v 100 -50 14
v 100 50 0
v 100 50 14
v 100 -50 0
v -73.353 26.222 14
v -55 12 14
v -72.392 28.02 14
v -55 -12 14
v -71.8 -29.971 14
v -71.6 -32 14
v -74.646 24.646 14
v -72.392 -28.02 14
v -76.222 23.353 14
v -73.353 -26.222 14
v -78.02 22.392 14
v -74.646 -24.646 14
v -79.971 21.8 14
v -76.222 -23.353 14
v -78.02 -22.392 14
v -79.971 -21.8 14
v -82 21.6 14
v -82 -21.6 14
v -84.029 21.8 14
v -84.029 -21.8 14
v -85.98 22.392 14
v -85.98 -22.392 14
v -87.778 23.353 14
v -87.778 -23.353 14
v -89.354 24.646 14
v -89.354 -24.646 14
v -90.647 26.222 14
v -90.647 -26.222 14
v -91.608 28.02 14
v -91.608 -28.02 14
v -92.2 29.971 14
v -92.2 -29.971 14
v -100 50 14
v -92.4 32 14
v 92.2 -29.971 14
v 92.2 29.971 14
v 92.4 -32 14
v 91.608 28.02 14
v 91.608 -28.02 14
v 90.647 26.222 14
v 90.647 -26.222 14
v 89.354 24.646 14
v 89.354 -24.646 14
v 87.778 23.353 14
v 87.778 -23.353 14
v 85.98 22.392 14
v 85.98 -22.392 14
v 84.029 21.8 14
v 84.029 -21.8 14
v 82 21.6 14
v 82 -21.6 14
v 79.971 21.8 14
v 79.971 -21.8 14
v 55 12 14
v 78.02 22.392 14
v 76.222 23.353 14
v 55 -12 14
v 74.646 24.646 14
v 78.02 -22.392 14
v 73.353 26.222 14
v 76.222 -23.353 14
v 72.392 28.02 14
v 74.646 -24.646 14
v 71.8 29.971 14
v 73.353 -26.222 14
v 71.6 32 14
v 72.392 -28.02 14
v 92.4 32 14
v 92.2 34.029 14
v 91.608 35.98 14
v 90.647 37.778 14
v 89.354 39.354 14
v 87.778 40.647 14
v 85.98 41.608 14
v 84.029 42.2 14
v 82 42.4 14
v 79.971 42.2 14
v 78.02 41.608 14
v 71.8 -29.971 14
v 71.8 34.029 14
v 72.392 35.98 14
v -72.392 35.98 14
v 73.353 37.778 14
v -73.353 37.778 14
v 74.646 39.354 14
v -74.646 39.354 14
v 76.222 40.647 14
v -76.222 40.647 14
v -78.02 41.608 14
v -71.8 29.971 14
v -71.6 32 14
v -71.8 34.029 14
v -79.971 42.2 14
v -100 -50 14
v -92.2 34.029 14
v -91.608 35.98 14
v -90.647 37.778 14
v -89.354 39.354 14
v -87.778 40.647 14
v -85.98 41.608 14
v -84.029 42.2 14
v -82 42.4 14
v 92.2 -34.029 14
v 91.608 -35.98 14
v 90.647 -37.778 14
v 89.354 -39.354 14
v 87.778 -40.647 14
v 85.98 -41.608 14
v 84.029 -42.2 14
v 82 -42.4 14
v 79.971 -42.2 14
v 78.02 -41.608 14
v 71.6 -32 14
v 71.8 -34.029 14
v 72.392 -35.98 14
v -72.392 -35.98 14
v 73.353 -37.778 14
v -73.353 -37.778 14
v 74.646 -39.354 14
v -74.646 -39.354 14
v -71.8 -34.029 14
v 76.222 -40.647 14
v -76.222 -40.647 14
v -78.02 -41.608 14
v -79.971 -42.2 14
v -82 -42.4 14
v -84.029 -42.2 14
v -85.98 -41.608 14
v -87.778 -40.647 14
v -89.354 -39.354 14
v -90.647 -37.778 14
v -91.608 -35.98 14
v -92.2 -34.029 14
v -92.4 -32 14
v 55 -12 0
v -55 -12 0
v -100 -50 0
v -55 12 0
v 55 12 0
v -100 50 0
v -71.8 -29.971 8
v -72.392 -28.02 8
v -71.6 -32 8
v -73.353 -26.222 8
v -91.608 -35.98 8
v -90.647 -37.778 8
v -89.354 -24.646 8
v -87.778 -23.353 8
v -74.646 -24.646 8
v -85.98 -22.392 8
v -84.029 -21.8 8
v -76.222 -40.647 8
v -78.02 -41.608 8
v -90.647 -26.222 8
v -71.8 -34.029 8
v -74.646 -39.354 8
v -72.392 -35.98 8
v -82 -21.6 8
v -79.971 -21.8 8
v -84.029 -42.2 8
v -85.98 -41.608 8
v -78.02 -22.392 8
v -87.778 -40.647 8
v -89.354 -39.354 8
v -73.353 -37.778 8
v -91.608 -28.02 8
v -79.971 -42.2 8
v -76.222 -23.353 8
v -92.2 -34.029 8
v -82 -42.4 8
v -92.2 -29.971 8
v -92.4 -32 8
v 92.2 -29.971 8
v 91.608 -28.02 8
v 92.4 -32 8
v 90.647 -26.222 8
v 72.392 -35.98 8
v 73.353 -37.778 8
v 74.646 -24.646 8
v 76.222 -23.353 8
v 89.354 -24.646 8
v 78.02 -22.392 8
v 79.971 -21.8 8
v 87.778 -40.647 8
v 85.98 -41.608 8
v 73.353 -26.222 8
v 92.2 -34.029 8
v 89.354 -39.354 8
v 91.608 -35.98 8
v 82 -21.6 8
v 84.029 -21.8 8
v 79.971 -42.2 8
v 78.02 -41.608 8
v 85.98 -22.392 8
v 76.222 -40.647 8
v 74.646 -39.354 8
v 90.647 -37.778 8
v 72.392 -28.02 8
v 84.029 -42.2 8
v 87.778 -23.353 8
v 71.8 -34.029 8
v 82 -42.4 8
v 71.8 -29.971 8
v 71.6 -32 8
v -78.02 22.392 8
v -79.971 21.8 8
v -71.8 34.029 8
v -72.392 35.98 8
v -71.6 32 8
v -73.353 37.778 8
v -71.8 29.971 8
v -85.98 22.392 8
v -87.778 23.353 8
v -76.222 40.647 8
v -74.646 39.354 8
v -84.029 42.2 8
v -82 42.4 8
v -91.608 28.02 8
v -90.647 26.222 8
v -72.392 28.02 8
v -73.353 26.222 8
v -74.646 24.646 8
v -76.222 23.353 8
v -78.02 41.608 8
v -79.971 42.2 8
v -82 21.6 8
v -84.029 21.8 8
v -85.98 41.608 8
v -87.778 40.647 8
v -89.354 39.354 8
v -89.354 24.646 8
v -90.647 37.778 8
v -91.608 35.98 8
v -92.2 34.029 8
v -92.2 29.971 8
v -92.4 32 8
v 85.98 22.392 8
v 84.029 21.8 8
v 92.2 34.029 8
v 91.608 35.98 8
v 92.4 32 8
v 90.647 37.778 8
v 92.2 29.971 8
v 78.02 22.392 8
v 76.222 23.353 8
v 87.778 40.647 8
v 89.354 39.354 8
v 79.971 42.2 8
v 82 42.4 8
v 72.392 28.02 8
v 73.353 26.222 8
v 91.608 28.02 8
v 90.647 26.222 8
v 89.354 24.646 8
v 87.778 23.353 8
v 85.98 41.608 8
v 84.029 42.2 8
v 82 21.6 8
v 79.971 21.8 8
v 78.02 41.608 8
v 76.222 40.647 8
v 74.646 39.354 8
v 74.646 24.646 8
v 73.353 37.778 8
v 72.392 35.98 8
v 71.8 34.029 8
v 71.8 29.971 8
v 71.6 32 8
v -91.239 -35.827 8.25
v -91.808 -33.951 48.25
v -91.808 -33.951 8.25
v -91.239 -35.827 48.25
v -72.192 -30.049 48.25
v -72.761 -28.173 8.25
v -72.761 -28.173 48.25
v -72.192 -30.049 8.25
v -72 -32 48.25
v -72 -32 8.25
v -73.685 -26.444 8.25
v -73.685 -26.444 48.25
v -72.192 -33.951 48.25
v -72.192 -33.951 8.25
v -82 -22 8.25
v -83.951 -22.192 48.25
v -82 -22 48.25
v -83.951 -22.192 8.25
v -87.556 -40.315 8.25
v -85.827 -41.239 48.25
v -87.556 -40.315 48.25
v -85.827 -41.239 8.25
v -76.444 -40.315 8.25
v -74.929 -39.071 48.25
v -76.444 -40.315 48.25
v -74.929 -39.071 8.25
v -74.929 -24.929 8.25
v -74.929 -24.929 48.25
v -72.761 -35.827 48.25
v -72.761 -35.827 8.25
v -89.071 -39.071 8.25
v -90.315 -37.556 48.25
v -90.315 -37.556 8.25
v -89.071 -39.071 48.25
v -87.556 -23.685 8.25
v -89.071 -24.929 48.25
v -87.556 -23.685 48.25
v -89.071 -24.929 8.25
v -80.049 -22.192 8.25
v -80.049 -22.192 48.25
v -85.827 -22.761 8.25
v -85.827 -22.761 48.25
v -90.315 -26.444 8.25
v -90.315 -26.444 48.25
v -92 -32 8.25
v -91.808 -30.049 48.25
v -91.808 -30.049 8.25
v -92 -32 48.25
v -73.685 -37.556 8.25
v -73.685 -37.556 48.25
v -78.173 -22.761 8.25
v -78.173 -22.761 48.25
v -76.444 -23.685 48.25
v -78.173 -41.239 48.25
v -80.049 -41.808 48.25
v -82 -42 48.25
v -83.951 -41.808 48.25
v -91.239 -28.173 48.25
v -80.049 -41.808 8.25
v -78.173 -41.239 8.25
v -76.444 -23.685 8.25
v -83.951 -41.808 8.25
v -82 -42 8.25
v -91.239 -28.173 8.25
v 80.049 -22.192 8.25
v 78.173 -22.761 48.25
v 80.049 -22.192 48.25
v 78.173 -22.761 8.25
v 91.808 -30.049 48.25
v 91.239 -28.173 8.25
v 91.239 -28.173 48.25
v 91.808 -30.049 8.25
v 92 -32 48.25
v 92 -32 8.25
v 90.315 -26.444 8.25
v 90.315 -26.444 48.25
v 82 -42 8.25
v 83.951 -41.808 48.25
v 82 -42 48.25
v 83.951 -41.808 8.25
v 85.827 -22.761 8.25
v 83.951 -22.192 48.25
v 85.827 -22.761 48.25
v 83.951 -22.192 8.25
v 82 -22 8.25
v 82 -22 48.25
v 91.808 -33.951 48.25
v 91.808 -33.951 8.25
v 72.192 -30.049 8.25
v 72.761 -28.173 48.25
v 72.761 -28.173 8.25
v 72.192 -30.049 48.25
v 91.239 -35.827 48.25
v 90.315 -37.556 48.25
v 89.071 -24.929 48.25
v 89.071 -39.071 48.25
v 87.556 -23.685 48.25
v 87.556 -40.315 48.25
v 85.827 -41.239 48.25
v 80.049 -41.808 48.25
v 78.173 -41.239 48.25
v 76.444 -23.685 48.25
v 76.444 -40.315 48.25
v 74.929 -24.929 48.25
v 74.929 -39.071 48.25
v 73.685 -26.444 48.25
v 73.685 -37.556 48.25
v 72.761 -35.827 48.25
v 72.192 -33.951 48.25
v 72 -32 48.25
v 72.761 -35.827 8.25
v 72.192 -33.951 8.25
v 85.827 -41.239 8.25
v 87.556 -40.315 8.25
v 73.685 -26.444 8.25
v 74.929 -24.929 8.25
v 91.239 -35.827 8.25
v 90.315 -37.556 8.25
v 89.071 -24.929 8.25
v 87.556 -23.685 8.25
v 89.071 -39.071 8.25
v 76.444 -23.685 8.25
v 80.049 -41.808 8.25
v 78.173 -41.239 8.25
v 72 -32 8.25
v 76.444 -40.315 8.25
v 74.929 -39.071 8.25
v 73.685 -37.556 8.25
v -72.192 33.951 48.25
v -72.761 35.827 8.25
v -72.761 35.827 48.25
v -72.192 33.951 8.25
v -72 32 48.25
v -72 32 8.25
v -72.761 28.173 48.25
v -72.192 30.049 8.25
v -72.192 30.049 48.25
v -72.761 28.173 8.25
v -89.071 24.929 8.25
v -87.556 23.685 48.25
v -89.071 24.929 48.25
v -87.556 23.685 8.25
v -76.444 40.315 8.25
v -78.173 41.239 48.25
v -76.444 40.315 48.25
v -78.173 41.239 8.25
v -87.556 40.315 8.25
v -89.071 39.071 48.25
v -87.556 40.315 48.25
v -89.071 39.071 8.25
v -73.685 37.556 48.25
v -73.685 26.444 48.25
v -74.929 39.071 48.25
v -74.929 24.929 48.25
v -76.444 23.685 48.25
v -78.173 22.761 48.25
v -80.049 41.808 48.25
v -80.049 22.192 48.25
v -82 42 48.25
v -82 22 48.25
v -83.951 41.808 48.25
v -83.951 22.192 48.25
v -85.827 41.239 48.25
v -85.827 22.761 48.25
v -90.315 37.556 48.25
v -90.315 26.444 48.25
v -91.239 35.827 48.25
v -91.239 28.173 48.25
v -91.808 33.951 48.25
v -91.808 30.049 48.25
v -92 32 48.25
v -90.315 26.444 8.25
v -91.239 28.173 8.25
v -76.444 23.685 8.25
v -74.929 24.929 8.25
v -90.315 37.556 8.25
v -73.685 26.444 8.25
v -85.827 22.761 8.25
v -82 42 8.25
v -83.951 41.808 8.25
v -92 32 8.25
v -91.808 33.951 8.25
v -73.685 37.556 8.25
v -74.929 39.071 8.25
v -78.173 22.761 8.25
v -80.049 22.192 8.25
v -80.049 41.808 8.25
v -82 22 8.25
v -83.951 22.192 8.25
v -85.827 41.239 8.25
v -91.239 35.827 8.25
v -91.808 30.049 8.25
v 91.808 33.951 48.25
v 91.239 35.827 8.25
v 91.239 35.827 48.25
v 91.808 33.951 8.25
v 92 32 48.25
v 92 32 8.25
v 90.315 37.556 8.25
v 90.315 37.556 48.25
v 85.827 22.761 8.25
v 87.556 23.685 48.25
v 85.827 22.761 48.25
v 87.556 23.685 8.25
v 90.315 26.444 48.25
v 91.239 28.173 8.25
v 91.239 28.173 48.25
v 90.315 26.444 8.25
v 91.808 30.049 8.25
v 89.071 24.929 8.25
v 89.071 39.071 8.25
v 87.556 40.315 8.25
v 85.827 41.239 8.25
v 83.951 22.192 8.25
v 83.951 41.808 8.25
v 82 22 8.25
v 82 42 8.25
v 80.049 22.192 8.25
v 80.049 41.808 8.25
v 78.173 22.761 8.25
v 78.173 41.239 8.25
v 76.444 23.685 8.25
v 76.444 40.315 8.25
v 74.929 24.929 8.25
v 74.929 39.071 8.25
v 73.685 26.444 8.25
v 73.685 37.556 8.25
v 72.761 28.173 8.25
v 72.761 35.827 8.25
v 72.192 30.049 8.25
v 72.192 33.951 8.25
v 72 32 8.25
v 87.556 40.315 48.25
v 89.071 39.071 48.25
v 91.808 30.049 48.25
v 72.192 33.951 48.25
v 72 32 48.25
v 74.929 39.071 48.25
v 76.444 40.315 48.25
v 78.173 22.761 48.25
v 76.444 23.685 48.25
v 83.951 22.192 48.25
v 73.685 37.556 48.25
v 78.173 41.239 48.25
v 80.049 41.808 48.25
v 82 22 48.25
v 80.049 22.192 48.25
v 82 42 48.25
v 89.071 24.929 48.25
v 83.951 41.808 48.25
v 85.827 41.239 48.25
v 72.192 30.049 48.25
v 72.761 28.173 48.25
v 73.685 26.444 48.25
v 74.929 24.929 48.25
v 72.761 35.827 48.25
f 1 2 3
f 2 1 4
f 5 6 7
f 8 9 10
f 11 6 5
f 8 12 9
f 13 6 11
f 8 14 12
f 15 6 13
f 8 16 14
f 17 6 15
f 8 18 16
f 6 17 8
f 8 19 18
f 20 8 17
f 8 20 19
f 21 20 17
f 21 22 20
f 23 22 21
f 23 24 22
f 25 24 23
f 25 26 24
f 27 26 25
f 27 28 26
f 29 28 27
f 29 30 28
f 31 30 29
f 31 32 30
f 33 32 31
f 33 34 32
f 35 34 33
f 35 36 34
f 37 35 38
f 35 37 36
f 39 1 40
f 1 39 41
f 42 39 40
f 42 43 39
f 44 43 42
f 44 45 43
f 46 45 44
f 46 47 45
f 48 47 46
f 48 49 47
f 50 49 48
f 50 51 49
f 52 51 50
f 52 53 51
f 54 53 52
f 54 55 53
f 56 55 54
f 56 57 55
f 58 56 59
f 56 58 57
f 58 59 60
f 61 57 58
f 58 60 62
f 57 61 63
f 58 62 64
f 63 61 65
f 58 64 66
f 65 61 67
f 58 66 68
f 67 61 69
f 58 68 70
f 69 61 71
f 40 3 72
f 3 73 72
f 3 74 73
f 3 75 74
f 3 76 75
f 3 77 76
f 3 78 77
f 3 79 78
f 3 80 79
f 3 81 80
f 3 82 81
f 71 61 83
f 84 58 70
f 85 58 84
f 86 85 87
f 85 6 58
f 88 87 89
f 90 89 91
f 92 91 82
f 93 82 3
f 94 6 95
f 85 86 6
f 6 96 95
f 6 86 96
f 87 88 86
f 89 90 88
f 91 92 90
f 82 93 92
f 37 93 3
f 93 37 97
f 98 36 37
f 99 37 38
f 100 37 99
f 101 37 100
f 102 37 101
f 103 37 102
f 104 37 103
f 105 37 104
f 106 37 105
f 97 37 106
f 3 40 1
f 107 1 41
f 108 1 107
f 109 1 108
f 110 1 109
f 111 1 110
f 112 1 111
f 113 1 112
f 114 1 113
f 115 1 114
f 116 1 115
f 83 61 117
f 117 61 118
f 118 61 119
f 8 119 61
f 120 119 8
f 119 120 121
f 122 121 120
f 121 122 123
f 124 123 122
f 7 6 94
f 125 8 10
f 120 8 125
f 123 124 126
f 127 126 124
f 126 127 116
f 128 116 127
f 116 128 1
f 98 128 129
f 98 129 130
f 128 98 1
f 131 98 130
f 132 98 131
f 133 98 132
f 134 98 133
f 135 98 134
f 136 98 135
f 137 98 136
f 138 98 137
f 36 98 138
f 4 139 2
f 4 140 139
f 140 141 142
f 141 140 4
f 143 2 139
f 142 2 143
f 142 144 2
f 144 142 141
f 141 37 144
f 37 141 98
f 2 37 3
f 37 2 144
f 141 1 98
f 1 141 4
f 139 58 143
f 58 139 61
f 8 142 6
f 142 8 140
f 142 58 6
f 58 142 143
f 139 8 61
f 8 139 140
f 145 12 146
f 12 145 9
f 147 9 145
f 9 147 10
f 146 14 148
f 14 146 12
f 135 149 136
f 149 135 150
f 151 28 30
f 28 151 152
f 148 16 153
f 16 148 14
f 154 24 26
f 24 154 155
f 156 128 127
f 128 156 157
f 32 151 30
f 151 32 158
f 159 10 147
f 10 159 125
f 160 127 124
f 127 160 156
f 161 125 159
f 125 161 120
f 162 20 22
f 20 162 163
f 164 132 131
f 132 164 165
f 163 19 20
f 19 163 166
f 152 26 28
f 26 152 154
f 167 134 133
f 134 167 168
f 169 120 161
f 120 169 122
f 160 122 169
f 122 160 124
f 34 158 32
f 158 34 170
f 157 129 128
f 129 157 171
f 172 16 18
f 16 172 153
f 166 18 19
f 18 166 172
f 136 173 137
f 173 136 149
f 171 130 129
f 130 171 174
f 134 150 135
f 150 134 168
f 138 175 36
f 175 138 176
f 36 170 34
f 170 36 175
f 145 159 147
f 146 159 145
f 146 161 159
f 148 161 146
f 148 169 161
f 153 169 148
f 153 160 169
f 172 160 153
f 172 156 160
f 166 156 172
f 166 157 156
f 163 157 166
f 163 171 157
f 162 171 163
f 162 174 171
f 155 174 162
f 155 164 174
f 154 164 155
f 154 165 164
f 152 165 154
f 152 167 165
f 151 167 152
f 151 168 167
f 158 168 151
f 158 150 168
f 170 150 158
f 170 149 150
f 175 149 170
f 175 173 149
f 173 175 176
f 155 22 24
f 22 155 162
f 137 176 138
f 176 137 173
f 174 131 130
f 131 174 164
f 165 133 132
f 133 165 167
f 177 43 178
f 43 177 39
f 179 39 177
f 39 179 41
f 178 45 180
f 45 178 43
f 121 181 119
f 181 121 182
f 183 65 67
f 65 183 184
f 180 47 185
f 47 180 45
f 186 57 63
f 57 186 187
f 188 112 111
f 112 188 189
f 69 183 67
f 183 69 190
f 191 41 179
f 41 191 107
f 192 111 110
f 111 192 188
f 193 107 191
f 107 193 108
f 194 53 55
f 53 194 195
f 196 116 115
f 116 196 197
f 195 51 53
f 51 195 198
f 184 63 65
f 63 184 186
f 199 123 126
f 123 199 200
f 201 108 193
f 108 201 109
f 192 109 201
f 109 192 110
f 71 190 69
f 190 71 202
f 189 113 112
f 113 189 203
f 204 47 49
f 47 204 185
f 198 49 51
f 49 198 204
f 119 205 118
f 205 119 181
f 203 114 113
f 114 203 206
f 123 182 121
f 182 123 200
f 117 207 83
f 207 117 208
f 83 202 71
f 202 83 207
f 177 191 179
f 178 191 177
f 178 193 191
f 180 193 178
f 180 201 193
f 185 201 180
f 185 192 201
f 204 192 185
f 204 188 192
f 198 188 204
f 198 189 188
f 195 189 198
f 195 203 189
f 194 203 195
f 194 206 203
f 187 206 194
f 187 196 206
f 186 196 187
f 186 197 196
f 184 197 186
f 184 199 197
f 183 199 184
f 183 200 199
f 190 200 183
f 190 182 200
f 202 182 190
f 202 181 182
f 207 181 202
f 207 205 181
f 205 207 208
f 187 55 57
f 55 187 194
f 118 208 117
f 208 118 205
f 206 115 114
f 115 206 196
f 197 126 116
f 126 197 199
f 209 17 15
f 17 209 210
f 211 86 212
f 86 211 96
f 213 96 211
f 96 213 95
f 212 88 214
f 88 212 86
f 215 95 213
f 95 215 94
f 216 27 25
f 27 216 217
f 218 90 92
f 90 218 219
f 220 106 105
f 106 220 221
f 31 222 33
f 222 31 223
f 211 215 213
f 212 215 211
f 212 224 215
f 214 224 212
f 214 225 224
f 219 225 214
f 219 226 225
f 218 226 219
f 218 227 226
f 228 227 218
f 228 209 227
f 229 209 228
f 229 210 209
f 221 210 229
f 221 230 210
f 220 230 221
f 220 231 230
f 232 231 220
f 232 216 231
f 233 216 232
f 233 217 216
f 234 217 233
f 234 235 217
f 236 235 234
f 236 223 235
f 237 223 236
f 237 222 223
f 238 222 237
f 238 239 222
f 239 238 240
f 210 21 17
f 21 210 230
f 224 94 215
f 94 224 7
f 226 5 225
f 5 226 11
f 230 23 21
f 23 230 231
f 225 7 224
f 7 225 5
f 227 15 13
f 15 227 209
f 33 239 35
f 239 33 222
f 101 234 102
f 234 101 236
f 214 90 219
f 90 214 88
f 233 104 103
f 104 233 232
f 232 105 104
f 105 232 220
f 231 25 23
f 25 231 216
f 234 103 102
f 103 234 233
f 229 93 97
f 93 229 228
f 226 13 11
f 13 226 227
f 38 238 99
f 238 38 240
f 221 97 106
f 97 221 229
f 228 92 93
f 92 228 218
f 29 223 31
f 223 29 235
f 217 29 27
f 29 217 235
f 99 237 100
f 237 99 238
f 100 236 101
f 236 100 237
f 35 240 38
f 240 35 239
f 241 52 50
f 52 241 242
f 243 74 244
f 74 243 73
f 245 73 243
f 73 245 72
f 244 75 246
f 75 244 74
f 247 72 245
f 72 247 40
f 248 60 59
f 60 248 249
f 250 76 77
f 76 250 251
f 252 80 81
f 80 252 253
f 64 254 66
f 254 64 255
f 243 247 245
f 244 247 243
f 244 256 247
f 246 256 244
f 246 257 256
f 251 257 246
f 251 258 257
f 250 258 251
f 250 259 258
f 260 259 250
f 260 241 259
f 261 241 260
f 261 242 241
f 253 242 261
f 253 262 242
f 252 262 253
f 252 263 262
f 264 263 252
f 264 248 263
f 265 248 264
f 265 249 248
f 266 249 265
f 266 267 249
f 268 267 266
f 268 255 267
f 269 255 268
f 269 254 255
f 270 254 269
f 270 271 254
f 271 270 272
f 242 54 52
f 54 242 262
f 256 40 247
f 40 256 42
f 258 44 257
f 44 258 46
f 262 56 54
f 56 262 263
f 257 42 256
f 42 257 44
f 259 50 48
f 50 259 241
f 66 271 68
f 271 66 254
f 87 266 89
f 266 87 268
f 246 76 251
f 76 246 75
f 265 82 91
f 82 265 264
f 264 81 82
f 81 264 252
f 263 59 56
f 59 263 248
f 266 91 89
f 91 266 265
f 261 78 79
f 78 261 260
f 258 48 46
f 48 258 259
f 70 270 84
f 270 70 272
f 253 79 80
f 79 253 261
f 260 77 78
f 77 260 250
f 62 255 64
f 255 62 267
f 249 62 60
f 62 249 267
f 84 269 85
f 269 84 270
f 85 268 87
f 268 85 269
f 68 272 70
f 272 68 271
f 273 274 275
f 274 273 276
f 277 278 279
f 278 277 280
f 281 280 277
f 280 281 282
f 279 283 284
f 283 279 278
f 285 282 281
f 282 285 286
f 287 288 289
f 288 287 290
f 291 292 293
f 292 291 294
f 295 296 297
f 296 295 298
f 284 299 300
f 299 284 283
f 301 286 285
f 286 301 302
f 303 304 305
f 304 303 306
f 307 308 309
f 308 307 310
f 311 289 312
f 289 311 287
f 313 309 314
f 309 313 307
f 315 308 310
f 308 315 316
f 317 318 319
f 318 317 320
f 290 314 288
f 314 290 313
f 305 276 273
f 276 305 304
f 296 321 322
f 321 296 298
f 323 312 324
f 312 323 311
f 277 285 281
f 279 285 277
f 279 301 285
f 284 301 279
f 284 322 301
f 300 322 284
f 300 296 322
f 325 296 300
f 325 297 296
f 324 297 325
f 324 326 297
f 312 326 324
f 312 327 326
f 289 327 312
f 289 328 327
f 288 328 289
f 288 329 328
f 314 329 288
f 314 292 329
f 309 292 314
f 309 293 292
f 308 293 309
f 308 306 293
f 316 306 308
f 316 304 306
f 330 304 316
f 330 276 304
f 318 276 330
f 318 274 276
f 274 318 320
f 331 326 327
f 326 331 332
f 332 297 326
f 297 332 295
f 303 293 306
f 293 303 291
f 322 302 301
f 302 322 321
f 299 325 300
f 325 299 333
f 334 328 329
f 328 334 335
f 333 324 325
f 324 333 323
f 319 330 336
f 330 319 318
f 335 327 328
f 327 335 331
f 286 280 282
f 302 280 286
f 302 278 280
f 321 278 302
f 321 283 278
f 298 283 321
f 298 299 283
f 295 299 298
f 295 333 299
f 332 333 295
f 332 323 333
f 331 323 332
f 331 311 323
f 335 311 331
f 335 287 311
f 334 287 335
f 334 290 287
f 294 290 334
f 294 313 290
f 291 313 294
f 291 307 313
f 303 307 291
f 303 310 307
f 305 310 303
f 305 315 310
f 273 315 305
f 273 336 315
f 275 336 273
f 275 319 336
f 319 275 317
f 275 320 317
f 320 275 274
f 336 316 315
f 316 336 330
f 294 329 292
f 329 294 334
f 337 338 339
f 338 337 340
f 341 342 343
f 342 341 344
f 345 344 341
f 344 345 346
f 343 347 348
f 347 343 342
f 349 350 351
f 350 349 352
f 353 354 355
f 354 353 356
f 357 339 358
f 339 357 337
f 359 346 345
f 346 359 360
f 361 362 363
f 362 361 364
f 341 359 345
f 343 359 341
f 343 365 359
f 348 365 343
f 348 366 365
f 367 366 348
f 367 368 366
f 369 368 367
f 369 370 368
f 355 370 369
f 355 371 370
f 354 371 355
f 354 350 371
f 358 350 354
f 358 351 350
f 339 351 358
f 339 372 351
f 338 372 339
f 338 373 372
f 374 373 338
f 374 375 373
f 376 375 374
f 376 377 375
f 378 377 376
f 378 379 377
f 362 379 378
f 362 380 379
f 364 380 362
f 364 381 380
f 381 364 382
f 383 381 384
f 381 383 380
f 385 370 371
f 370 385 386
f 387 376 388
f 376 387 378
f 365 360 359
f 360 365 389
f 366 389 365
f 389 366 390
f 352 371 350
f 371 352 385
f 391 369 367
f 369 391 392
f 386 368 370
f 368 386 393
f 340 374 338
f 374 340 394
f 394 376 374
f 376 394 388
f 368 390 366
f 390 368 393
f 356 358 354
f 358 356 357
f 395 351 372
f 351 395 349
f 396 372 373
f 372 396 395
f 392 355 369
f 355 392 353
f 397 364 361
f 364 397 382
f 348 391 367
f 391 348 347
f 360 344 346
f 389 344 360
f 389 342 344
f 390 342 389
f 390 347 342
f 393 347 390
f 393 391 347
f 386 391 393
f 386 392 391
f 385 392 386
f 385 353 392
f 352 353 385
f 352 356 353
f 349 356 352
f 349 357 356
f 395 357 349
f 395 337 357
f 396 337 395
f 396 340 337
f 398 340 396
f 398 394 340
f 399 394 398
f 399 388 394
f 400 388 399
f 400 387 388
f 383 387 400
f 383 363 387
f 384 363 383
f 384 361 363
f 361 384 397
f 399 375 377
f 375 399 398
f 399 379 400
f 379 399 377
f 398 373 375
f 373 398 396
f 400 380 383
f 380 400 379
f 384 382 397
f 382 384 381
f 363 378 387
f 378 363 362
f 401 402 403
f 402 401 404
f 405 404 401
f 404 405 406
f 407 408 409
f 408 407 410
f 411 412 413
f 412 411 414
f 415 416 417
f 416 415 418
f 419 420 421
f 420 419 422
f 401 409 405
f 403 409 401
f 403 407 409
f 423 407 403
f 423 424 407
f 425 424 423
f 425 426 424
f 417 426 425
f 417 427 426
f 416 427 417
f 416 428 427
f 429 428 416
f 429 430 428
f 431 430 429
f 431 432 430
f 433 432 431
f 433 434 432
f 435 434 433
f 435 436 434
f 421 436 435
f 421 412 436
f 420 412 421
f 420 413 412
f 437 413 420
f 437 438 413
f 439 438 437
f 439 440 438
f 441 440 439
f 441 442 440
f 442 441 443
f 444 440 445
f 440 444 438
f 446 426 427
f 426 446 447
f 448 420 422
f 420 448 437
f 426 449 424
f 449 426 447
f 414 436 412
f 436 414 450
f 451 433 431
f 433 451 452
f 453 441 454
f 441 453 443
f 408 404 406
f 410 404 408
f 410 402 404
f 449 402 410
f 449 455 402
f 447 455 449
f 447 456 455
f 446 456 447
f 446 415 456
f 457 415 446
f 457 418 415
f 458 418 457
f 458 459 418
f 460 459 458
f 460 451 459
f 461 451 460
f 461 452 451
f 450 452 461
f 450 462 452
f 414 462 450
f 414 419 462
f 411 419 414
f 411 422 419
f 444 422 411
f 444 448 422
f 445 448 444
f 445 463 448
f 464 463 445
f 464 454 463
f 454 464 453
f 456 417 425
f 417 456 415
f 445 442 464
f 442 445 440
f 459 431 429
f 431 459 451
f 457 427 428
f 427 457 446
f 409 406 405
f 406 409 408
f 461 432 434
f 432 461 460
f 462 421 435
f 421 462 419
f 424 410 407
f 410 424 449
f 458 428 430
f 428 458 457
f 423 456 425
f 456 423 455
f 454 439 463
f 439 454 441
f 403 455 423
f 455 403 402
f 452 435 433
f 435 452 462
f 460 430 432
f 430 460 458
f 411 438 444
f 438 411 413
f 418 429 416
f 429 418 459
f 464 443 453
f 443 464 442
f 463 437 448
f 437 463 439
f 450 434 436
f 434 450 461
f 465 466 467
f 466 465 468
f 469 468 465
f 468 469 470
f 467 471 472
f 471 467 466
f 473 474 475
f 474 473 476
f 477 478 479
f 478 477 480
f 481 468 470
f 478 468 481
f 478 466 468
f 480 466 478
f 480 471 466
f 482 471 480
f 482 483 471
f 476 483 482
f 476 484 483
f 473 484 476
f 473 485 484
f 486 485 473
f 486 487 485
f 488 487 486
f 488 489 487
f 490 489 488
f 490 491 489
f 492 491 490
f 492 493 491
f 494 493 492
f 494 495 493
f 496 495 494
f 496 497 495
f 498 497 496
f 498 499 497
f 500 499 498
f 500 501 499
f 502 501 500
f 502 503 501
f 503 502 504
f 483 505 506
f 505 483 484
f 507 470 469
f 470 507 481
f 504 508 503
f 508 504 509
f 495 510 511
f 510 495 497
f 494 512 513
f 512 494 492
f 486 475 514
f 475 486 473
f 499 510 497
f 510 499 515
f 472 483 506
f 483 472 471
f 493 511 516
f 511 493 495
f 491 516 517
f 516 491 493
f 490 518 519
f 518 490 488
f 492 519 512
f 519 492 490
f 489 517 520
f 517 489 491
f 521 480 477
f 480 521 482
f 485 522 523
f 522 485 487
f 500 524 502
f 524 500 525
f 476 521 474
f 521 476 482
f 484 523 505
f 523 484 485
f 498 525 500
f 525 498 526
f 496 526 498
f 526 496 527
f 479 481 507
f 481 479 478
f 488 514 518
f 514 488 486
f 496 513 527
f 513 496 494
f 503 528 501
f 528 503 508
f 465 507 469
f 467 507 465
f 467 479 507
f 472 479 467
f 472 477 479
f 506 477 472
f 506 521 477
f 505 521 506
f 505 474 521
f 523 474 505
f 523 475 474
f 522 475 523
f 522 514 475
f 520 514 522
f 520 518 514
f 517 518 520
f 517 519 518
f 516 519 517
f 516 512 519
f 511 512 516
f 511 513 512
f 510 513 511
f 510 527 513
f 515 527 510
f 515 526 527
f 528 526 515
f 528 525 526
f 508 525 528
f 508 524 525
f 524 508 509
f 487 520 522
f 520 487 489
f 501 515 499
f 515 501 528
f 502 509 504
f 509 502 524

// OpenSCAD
$fn = 32;

// ------------------------------------------------------------------------
// Frame with four posts: 200 x 100 mm frame, four d20 posts
// Every part is its own module, assembly() places them once.
// ------------------------------------------------------------------------

// --- part 1 ---
module base_frame() {
  difference() {
    translate([-100, -50, 0]) cube([200, 100, 14]);
    translate([-55, -12, -1]) cube([110, 24, 16]);
    translate([-82, -32, 8]) cylinder(h = 7, d = 20.8);
    translate([82, -32, 8]) cylinder(h = 7, d = 20.8);
    translate([-82, 32, 8]) cylinder(h = 7, d = 20.8);
    translate([82, 32, 8]) cylinder(h = 7, d = 20.8);
  }
}

// --- part 2 ---
module post1() {
  cylinder(h = 40, d = 20);
}

// --- part 3 ---
module post2() {
  cylinder(h = 40, d = 20);
}

// --- part 4 ---
module post3() {
  cylinder(h = 40, d = 20);
}

// --- part 5 ---
module post4() {
  cylinder(h = 40, d = 20);
}

// --- assembly ---
module assembly() {
  translate([0, 0, 0]) rotate([0, 0, 0]) base_frame();
  translate([-82, -32, 8.25]) rotate([0, 0, 0]) post1();
  translate([82, -32, 8.25]) rotate([0, 0, 0]) post2();
  translate([-82, 32, 8.25]) rotate([0, 0, 0]) post3();
  translate([82, 32, 8.25]) rotate([0, 0, 0]) post4();
}

assembly();
